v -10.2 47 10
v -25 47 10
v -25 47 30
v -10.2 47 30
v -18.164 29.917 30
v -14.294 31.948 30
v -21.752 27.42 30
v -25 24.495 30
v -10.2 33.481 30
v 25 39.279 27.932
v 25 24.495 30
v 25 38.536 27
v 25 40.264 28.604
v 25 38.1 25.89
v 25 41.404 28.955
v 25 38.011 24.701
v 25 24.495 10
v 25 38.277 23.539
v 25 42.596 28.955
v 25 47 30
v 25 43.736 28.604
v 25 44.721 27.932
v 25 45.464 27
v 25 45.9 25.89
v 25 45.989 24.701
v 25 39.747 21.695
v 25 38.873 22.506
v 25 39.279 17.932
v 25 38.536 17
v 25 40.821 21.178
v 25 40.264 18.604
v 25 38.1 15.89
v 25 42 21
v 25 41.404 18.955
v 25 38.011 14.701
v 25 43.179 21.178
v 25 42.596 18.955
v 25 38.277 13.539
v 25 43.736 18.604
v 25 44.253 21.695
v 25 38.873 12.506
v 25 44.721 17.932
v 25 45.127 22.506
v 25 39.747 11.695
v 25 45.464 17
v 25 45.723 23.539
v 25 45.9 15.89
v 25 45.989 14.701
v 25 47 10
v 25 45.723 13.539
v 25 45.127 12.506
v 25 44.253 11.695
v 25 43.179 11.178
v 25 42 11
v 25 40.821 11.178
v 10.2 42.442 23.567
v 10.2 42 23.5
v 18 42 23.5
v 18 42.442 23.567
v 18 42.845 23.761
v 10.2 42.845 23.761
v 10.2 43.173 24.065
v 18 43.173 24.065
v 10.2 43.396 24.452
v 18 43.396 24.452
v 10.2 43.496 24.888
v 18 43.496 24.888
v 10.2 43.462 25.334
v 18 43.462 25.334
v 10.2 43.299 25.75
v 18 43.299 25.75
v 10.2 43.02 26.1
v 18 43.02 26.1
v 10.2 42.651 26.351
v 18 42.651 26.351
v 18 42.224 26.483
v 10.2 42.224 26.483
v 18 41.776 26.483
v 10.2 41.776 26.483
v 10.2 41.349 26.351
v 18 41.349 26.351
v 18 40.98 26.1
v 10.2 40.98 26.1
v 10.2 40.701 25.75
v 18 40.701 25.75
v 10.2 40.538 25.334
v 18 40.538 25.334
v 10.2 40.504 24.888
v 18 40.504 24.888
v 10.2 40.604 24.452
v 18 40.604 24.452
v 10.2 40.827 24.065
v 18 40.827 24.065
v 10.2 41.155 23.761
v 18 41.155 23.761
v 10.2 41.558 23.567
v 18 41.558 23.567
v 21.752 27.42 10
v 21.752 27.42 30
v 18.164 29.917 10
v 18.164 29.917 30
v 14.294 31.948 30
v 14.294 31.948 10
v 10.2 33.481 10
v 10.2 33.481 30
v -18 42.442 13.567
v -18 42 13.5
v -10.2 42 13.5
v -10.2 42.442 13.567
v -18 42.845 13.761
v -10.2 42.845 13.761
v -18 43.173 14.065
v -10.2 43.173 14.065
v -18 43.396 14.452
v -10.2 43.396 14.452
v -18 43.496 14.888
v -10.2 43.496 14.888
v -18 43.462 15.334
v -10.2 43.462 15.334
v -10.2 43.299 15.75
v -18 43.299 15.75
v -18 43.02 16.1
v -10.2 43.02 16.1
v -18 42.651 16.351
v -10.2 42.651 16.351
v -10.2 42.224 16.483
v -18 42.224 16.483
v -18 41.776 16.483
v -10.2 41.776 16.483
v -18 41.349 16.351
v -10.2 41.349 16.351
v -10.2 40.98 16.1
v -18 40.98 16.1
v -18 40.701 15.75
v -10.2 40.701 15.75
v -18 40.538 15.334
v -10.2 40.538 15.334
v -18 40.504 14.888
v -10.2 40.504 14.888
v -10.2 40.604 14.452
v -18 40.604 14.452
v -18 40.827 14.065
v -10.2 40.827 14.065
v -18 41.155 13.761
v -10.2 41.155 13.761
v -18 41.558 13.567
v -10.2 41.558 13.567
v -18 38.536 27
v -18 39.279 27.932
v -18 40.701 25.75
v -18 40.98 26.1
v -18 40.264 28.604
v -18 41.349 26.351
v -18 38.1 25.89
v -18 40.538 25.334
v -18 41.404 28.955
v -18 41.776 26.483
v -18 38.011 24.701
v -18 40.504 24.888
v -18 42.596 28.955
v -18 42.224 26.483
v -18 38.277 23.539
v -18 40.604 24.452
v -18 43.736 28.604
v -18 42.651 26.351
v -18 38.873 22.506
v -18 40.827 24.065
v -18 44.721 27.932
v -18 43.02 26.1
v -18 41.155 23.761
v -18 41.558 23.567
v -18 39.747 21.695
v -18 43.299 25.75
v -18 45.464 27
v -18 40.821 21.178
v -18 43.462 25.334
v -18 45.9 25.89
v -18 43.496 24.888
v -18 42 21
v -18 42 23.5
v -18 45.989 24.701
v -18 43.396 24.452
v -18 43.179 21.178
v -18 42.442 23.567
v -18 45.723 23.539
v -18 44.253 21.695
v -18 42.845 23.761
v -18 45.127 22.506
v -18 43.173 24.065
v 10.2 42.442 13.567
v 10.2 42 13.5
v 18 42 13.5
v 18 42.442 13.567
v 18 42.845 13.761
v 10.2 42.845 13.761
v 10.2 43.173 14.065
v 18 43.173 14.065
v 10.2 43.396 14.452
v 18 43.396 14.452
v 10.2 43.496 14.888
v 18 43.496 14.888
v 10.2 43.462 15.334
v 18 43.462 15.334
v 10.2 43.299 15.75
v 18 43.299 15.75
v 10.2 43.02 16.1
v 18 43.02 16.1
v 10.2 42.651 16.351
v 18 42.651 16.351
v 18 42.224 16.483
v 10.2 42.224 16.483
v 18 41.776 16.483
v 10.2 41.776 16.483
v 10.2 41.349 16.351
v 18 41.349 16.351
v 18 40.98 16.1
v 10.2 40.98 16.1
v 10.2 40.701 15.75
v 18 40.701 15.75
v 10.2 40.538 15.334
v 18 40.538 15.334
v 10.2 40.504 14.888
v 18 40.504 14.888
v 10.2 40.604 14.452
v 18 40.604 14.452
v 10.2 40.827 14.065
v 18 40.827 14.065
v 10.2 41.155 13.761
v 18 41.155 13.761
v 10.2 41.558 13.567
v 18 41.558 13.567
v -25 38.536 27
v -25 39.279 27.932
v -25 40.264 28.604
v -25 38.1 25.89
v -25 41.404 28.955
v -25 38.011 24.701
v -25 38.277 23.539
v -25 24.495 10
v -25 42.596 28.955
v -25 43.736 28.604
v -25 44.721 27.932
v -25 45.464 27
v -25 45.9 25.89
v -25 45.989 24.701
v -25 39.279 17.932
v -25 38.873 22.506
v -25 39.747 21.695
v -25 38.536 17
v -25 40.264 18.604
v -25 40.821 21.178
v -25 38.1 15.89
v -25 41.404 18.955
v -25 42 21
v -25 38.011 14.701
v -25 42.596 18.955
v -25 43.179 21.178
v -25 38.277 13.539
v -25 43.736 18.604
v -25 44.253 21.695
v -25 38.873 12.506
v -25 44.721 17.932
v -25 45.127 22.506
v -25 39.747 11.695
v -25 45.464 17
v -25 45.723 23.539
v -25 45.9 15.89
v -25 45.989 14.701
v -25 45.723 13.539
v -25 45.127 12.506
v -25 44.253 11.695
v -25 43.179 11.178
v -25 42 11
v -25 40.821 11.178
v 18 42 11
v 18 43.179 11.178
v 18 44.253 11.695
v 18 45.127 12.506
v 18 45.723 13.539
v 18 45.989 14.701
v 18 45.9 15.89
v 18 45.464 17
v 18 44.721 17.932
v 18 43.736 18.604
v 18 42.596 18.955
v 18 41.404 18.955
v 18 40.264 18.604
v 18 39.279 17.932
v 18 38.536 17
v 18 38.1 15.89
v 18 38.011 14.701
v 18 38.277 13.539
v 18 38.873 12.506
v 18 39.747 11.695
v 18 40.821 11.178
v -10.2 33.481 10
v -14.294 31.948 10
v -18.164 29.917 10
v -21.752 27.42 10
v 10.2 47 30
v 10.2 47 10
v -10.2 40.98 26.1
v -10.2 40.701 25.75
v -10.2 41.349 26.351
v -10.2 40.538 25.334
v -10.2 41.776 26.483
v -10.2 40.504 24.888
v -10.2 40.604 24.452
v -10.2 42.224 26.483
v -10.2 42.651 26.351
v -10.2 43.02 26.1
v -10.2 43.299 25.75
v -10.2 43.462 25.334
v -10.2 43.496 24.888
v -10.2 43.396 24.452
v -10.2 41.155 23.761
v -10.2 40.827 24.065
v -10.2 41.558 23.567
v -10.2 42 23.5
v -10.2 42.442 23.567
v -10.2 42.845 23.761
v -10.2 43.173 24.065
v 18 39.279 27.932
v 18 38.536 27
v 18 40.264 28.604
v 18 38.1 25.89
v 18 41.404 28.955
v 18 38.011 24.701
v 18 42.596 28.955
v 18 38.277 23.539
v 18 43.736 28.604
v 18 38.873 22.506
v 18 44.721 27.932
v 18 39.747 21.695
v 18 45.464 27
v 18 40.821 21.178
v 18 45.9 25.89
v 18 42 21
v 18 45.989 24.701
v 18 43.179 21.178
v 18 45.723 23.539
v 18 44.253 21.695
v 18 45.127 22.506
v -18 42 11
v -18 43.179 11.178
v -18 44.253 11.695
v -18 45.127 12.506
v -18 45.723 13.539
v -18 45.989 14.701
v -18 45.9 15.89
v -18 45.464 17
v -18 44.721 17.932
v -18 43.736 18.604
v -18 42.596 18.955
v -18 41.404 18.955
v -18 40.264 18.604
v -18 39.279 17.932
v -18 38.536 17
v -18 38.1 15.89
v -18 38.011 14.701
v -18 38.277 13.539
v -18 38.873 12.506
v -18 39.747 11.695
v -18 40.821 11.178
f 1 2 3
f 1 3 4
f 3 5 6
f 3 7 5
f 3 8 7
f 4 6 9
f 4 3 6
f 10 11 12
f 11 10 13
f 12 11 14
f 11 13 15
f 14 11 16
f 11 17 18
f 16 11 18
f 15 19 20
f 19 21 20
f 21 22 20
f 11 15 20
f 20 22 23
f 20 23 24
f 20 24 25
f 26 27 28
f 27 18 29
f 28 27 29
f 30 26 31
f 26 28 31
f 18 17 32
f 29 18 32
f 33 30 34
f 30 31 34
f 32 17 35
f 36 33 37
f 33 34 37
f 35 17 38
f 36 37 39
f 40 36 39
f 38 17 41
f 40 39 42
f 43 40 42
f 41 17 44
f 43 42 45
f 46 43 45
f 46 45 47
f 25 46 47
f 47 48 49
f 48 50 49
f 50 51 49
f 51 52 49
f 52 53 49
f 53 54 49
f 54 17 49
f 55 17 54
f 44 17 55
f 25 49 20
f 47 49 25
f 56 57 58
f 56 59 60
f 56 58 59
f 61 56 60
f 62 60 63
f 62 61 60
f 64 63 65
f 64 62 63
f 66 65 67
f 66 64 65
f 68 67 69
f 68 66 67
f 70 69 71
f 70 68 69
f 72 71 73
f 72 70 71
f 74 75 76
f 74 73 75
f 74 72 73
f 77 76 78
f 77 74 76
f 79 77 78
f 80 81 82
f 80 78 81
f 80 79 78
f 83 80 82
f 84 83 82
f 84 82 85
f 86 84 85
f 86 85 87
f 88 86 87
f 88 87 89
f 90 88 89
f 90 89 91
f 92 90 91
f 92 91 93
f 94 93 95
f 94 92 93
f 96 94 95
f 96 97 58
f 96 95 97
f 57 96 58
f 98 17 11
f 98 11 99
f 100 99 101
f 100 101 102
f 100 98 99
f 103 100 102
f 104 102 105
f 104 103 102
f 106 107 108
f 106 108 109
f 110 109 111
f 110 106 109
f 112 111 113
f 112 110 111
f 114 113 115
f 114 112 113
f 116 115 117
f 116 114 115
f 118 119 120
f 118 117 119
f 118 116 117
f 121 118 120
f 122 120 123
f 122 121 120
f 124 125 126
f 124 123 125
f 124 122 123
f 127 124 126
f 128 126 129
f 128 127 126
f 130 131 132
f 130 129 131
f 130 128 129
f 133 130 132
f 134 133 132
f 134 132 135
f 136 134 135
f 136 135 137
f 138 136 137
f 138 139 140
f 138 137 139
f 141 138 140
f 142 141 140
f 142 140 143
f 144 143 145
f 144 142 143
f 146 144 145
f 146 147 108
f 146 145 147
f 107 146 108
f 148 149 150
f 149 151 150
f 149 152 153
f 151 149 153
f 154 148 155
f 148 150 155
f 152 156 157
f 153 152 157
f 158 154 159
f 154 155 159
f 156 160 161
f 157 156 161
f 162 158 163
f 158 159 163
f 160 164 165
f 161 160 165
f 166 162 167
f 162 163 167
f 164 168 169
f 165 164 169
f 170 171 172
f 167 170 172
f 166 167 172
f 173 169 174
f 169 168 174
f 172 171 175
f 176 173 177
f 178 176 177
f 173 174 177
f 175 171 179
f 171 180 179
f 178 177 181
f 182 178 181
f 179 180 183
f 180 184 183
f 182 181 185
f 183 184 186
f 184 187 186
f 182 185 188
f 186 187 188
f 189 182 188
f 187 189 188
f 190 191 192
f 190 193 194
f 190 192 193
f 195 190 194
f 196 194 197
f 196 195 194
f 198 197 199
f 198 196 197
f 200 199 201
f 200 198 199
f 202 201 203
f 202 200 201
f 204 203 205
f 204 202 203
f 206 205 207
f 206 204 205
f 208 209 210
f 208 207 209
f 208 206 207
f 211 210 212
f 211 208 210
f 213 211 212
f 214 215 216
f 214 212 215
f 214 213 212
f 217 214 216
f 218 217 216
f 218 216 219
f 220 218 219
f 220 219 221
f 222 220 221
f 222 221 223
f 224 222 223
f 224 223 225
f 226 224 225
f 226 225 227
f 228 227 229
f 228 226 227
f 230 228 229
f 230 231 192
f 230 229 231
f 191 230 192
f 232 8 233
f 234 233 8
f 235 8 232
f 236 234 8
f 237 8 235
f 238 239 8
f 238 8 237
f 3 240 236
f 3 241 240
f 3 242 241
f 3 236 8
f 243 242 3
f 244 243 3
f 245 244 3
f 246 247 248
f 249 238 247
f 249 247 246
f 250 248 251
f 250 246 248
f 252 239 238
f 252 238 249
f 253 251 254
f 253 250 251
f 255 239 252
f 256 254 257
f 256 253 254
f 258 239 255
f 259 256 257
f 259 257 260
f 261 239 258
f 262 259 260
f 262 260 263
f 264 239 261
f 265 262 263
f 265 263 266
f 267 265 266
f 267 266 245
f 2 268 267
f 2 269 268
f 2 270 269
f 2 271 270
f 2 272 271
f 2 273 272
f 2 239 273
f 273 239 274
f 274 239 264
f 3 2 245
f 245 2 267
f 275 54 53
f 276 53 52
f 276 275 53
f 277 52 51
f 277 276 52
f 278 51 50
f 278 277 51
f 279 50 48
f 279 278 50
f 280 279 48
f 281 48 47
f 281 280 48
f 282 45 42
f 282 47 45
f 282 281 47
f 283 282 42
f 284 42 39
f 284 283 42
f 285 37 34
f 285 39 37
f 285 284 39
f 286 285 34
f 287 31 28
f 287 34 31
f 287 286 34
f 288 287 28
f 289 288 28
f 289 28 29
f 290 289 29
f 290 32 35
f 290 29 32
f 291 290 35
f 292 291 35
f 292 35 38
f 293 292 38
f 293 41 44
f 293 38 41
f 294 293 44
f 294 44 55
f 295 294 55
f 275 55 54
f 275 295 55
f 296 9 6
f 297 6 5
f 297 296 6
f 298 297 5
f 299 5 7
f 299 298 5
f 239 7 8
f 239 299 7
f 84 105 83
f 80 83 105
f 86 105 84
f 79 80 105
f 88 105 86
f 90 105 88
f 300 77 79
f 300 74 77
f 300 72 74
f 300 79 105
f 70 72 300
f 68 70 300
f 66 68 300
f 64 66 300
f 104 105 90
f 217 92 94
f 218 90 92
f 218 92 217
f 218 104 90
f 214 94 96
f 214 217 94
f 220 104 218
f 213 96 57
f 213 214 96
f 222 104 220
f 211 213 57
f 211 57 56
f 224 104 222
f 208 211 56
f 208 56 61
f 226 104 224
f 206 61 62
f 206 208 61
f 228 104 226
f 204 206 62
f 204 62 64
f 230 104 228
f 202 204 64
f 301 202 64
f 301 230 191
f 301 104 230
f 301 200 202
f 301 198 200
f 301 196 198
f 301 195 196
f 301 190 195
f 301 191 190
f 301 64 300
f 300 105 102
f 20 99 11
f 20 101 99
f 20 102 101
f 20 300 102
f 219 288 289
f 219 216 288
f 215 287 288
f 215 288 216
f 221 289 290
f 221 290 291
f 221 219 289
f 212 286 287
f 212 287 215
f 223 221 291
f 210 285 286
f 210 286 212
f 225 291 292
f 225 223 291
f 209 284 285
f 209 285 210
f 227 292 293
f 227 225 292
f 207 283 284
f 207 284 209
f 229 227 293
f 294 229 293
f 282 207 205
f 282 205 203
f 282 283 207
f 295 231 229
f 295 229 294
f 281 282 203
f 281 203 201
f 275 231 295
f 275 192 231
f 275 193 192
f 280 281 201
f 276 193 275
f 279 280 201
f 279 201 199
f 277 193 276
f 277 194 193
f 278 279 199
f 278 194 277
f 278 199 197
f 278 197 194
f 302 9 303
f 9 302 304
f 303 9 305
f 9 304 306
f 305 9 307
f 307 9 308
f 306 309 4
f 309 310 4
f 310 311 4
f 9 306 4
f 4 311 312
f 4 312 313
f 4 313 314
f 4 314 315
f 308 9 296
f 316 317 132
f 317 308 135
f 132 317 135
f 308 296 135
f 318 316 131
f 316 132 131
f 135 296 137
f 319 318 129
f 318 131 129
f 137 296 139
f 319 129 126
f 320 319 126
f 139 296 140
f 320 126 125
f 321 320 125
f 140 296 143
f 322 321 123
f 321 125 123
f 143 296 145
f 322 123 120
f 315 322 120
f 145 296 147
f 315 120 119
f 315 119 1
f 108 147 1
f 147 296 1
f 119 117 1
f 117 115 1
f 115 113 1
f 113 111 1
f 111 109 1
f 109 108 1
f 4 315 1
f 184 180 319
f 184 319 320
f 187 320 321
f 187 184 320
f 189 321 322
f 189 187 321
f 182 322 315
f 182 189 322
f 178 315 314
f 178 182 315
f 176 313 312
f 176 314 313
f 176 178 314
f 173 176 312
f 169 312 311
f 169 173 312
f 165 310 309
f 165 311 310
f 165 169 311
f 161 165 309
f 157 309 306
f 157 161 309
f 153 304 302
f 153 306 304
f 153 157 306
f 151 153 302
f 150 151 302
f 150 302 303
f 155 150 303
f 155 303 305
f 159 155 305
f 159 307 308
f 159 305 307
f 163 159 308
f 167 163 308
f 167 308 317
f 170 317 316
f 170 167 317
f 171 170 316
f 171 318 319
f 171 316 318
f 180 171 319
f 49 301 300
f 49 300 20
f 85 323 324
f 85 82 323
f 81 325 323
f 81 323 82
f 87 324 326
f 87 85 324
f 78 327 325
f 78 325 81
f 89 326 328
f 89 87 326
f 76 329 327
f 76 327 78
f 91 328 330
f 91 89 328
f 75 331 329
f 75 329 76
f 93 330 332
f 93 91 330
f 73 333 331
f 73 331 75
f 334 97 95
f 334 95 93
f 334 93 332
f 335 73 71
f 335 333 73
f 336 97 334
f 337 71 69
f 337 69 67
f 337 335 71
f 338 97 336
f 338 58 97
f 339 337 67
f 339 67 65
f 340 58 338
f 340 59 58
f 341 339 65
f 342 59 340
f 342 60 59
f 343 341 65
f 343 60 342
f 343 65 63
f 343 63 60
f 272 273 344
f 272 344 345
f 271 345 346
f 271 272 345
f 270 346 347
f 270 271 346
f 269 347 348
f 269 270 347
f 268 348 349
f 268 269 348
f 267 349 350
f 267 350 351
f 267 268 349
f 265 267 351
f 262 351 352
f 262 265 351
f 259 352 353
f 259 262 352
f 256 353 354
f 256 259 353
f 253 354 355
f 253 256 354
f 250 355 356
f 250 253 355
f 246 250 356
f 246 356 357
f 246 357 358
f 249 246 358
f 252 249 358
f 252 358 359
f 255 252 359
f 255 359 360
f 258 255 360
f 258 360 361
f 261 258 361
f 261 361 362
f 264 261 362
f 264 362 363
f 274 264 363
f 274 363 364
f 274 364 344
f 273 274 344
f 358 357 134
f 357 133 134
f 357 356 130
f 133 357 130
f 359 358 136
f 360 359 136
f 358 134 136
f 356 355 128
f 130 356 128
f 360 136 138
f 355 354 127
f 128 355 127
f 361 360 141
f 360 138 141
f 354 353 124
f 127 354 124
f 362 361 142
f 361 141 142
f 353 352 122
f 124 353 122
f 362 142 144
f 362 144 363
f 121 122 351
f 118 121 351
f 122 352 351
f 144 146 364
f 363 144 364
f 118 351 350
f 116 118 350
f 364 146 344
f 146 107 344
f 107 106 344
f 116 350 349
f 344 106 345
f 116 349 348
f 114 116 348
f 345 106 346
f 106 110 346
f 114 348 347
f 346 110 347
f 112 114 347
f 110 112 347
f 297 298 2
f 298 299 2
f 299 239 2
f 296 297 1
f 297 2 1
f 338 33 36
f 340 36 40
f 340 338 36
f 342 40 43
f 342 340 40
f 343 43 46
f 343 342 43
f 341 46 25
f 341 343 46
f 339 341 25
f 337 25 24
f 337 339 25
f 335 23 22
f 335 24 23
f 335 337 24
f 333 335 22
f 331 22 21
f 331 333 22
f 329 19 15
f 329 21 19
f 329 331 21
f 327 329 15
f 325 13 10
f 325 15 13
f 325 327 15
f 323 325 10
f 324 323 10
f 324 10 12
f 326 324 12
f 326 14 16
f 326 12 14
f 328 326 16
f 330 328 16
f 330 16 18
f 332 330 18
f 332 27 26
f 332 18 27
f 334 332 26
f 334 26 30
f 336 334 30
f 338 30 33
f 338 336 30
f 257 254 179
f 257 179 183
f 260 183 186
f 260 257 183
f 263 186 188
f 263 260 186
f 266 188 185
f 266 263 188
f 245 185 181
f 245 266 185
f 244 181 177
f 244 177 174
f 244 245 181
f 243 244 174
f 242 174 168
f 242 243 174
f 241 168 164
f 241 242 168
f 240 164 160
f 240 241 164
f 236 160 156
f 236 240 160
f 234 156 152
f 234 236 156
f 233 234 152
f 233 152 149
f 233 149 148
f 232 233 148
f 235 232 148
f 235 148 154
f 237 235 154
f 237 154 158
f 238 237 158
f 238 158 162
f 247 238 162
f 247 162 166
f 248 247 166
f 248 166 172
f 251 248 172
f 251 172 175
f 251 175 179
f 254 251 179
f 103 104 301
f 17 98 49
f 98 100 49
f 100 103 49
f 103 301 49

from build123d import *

# Parameters (mm, degrees)
CYLINDER1981_R     = 1.5
CYLINDER1981_DEPTH = 20
CYLINDER1985_R     = 1.5
CYLINDER1985_DEPTH = 20
CYLINDER1987_R     = 1.5
CYLINDER1987_DEPTH = 20
CYLINDER1973_R     = 1.5
CYLINDER1973_DEPTH = 20
CYLINDER1978_R     = 4
CYLINDER1978_DEPTH = 20
CYLINDER1988_R     = 4
CYLINDER1988_DEPTH = 20
CYLINDER1986_R     = 4
CYLINDER1986_DEPTH = 20
CYLINDER1976_R     = 4
CYLINDER1976_DEPTH = 20
BOX764_W           = 20.4
BOX764_H           = 27
BOX764_DEPTH       = 20
CYLINDER1983_R     = 35
CYLINDER1983_DEPTH = 20
BOX766_W           = 50
BOX766_H           = 32
BOX766_DEPTH       = 20


with BuildPart() as v_lec1981:
    # Cylinder1981 → Cylinder1981 (new body)
    with BuildSketch(Plane(origin=(-24, 38, 25), x_dir=(0, 0, -1), z_dir=(1, 0, 0))):
        Circle(CYLINDER1981_R)
    extrude(amount=CYLINDER1981_DEPTH)


with BuildPart() as v_lec1985:
    # Cylinder1985 → Cylinder1985 (new body)
    with BuildSketch(Plane(origin=(4, 38, 15), x_dir=(0, 0, -1), z_dir=(1, 0, 0))):
        Circle(CYLINDER1985_R)
    extrude(amount=CYLINDER1985_DEPTH)


with BuildPart() as v_lec1987:
    # Cylinder1987 → Cylinder1987 (new body)
    with BuildSketch(Plane(origin=(-24, 38, 15), x_dir=(0, 0, -1), z_dir=(1, 0, 0))):
        Circle(CYLINDER1987_R)
    extrude(amount=CYLINDER1987_DEPTH)


with BuildPart() as compound940:
    # Cylinder1973 → Cylinder1973 (new body)
    with BuildSketch(Plane(origin=(4, 38, 25), x_dir=(0, 0, -1), z_dir=(1, 0, 0))):
        Circle(CYLINDER1973_R)
    extrude(amount=CYLINDER1973_DEPTH)

    # Compound940: union Válec1981, Válec1985, Válec1987
    add(v_lec1981.part)
    add(v_lec1985.part)
    add(v_lec1987.part)


with BuildPart() as compound940_1:
    # Compound940 placement: moved
    add(compound940.part.moved(Location((0, 4, 0))))


with BuildPart() as v_lec1978:
    # Cylinder1978 → Cylinder1978 (new body)
    with BuildSketch(Plane(origin=(-38, 38, 25), x_dir=(0, 0, -1), z_dir=(1, 0, 0))):
        Circle(CYLINDER1978_R)
    extrude(amount=CYLINDER1978_DEPTH)


with BuildPart() as v_lec1988:
    # Cylinder1988 → Cylinder1988 (new body)
    with BuildSketch(Plane(origin=(18, 38, 15), x_dir=(0, 0, -1), z_dir=(1, 0, 0))):
        Circle(CYLINDER1988_R)
    extrude(amount=CYLINDER1988_DEPTH)


with BuildPart() as v_lec1986:
    # Cylinder1986 → Cylinder1986 (new body)
    with BuildSketch(Plane(origin=(-38, 38, 15), x_dir=(0, 0, -1), z_dir=(1, 0, 0))):
        Circle(CYLINDER1986_R)
    extrude(amount=CYLINDER1986_DEPTH)


with BuildPart() as compound937:
    # Cylinder1976 → Cylinder1976 (new body)
    with BuildSketch(Plane(origin=(18, 38, 25), x_dir=(0, 0, -1), z_dir=(1, 0, 0))):
        Circle(CYLINDER1976_R)
    extrude(amount=CYLINDER1976_DEPTH)

    # Compound937: union Válec1978, Válec1988, Válec1986
    add(v_lec1978.part)
    add(v_lec1988.part)
    add(v_lec1986.part)


with BuildPart() as compound937_1:
    # Compound937 placement: moved
    add(compound937.part.moved(Location((0, 4, 0))))


with BuildPart() as krychle764:
    # Box764 → Box764 (new body)
    with BuildSketch(Plane(origin=(-10.2, 20, 10), x_dir=(1, 0, 0), z_dir=(0, 0, 1))):
        with Locations((10.2, 13.5)):
            Rectangle(BOX764_W, BOX764_H)
    extrude(amount=BOX764_DEPTH)


with BuildPart() as v_lec1983:
    # Cylinder1983 → Cylinder1983 (new body)
    with BuildSketch(Plane.XY.offset(10)):
        Circle(CYLINDER1983_R)
    extrude(amount=CYLINDER1983_DEPTH)


with BuildPart() as cut594:
    # Box766 → Box766 (new body)
    with BuildSketch(Plane(origin=(-25, 15, 10), x_dir=(1, 0, 0), z_dir=(0, 0, 1))):
        with Locations((25, 16)):
            Rectangle(BOX766_W, BOX766_H)
    extrude(amount=BOX766_DEPTH)

    # Cut592: cut Válec1983
    add(v_lec1983.part, mode=Mode.SUBTRACT)

    # Cut595: cut Krychle764
    add(krychle764.part, mode=Mode.SUBTRACT)

    # Cut596: cut Compound937
    add(compound937_1.part, mode=Mode.SUBTRACT)

    # Cut594: cut Compound940
    add(compound940_1.part, mode=Mode.SUBTRACT)


solid = cut594.part
